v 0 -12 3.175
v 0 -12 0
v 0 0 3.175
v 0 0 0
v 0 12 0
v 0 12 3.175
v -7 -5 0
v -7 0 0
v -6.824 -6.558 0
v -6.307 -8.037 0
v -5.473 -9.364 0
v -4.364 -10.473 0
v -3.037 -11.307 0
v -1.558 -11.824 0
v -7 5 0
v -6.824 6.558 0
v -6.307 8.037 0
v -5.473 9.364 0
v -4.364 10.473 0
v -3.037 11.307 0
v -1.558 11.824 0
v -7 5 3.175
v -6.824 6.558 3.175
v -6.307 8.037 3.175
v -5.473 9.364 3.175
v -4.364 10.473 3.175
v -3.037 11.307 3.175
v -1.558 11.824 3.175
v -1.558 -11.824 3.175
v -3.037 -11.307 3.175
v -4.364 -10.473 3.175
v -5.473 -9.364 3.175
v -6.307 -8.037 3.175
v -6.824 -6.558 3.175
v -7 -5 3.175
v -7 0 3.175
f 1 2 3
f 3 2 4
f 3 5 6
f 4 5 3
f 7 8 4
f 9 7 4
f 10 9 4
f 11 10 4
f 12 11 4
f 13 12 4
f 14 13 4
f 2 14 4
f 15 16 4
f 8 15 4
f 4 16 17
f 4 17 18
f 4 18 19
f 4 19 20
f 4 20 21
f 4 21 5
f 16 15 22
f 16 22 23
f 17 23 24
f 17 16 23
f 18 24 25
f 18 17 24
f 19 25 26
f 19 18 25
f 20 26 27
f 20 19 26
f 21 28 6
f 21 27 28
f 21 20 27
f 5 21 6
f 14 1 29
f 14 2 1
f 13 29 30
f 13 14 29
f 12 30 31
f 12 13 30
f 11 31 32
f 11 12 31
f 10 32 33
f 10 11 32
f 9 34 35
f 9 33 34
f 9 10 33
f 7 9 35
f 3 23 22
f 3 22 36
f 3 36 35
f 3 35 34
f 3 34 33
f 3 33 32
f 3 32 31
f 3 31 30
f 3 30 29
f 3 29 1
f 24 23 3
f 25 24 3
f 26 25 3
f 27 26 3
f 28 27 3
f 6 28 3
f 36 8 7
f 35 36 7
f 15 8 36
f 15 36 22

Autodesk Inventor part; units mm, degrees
ref_plane "YZ Plane" through (0, 0, 0) normal (1, 0, 0) x (0, 1, 0)
ref_plane "XZ Plane" through (0, 0, 0) normal (0, 1, 0) x (-1, 0, 0)
ref_plane "XY Plane" through (0, 0, 0) normal (0, 0, 1) x (1, 0, 0)
sketch "Sketch1" plane through (0, 0, 0) normal (0, 0, 1) x (1, 0, 0)
  line L0 (0, 0) -> (-7, 0) construction
  line L1 (-7, 0) -> (-7, 5)
  arc A0 (0, 12) -> (-7, 5) centre (0, 5) ccw
  line L2 (0, 12) -> (0, 0)
  line L3 (-7, 0) -> (-7, -5)
  arc A1 (-7, -5) -> (0, -12) centre (0, -5) ccw
  line L4 (0, -12) -> (0, 0)
  dimension "d0" = 7
  dimension "d2" = 7
  dimension "d5" = 5
extrude "Extrusion1" add sketch "Sketch1" along normal blind 3.175
properties part number "waterbottle_holder_side"
